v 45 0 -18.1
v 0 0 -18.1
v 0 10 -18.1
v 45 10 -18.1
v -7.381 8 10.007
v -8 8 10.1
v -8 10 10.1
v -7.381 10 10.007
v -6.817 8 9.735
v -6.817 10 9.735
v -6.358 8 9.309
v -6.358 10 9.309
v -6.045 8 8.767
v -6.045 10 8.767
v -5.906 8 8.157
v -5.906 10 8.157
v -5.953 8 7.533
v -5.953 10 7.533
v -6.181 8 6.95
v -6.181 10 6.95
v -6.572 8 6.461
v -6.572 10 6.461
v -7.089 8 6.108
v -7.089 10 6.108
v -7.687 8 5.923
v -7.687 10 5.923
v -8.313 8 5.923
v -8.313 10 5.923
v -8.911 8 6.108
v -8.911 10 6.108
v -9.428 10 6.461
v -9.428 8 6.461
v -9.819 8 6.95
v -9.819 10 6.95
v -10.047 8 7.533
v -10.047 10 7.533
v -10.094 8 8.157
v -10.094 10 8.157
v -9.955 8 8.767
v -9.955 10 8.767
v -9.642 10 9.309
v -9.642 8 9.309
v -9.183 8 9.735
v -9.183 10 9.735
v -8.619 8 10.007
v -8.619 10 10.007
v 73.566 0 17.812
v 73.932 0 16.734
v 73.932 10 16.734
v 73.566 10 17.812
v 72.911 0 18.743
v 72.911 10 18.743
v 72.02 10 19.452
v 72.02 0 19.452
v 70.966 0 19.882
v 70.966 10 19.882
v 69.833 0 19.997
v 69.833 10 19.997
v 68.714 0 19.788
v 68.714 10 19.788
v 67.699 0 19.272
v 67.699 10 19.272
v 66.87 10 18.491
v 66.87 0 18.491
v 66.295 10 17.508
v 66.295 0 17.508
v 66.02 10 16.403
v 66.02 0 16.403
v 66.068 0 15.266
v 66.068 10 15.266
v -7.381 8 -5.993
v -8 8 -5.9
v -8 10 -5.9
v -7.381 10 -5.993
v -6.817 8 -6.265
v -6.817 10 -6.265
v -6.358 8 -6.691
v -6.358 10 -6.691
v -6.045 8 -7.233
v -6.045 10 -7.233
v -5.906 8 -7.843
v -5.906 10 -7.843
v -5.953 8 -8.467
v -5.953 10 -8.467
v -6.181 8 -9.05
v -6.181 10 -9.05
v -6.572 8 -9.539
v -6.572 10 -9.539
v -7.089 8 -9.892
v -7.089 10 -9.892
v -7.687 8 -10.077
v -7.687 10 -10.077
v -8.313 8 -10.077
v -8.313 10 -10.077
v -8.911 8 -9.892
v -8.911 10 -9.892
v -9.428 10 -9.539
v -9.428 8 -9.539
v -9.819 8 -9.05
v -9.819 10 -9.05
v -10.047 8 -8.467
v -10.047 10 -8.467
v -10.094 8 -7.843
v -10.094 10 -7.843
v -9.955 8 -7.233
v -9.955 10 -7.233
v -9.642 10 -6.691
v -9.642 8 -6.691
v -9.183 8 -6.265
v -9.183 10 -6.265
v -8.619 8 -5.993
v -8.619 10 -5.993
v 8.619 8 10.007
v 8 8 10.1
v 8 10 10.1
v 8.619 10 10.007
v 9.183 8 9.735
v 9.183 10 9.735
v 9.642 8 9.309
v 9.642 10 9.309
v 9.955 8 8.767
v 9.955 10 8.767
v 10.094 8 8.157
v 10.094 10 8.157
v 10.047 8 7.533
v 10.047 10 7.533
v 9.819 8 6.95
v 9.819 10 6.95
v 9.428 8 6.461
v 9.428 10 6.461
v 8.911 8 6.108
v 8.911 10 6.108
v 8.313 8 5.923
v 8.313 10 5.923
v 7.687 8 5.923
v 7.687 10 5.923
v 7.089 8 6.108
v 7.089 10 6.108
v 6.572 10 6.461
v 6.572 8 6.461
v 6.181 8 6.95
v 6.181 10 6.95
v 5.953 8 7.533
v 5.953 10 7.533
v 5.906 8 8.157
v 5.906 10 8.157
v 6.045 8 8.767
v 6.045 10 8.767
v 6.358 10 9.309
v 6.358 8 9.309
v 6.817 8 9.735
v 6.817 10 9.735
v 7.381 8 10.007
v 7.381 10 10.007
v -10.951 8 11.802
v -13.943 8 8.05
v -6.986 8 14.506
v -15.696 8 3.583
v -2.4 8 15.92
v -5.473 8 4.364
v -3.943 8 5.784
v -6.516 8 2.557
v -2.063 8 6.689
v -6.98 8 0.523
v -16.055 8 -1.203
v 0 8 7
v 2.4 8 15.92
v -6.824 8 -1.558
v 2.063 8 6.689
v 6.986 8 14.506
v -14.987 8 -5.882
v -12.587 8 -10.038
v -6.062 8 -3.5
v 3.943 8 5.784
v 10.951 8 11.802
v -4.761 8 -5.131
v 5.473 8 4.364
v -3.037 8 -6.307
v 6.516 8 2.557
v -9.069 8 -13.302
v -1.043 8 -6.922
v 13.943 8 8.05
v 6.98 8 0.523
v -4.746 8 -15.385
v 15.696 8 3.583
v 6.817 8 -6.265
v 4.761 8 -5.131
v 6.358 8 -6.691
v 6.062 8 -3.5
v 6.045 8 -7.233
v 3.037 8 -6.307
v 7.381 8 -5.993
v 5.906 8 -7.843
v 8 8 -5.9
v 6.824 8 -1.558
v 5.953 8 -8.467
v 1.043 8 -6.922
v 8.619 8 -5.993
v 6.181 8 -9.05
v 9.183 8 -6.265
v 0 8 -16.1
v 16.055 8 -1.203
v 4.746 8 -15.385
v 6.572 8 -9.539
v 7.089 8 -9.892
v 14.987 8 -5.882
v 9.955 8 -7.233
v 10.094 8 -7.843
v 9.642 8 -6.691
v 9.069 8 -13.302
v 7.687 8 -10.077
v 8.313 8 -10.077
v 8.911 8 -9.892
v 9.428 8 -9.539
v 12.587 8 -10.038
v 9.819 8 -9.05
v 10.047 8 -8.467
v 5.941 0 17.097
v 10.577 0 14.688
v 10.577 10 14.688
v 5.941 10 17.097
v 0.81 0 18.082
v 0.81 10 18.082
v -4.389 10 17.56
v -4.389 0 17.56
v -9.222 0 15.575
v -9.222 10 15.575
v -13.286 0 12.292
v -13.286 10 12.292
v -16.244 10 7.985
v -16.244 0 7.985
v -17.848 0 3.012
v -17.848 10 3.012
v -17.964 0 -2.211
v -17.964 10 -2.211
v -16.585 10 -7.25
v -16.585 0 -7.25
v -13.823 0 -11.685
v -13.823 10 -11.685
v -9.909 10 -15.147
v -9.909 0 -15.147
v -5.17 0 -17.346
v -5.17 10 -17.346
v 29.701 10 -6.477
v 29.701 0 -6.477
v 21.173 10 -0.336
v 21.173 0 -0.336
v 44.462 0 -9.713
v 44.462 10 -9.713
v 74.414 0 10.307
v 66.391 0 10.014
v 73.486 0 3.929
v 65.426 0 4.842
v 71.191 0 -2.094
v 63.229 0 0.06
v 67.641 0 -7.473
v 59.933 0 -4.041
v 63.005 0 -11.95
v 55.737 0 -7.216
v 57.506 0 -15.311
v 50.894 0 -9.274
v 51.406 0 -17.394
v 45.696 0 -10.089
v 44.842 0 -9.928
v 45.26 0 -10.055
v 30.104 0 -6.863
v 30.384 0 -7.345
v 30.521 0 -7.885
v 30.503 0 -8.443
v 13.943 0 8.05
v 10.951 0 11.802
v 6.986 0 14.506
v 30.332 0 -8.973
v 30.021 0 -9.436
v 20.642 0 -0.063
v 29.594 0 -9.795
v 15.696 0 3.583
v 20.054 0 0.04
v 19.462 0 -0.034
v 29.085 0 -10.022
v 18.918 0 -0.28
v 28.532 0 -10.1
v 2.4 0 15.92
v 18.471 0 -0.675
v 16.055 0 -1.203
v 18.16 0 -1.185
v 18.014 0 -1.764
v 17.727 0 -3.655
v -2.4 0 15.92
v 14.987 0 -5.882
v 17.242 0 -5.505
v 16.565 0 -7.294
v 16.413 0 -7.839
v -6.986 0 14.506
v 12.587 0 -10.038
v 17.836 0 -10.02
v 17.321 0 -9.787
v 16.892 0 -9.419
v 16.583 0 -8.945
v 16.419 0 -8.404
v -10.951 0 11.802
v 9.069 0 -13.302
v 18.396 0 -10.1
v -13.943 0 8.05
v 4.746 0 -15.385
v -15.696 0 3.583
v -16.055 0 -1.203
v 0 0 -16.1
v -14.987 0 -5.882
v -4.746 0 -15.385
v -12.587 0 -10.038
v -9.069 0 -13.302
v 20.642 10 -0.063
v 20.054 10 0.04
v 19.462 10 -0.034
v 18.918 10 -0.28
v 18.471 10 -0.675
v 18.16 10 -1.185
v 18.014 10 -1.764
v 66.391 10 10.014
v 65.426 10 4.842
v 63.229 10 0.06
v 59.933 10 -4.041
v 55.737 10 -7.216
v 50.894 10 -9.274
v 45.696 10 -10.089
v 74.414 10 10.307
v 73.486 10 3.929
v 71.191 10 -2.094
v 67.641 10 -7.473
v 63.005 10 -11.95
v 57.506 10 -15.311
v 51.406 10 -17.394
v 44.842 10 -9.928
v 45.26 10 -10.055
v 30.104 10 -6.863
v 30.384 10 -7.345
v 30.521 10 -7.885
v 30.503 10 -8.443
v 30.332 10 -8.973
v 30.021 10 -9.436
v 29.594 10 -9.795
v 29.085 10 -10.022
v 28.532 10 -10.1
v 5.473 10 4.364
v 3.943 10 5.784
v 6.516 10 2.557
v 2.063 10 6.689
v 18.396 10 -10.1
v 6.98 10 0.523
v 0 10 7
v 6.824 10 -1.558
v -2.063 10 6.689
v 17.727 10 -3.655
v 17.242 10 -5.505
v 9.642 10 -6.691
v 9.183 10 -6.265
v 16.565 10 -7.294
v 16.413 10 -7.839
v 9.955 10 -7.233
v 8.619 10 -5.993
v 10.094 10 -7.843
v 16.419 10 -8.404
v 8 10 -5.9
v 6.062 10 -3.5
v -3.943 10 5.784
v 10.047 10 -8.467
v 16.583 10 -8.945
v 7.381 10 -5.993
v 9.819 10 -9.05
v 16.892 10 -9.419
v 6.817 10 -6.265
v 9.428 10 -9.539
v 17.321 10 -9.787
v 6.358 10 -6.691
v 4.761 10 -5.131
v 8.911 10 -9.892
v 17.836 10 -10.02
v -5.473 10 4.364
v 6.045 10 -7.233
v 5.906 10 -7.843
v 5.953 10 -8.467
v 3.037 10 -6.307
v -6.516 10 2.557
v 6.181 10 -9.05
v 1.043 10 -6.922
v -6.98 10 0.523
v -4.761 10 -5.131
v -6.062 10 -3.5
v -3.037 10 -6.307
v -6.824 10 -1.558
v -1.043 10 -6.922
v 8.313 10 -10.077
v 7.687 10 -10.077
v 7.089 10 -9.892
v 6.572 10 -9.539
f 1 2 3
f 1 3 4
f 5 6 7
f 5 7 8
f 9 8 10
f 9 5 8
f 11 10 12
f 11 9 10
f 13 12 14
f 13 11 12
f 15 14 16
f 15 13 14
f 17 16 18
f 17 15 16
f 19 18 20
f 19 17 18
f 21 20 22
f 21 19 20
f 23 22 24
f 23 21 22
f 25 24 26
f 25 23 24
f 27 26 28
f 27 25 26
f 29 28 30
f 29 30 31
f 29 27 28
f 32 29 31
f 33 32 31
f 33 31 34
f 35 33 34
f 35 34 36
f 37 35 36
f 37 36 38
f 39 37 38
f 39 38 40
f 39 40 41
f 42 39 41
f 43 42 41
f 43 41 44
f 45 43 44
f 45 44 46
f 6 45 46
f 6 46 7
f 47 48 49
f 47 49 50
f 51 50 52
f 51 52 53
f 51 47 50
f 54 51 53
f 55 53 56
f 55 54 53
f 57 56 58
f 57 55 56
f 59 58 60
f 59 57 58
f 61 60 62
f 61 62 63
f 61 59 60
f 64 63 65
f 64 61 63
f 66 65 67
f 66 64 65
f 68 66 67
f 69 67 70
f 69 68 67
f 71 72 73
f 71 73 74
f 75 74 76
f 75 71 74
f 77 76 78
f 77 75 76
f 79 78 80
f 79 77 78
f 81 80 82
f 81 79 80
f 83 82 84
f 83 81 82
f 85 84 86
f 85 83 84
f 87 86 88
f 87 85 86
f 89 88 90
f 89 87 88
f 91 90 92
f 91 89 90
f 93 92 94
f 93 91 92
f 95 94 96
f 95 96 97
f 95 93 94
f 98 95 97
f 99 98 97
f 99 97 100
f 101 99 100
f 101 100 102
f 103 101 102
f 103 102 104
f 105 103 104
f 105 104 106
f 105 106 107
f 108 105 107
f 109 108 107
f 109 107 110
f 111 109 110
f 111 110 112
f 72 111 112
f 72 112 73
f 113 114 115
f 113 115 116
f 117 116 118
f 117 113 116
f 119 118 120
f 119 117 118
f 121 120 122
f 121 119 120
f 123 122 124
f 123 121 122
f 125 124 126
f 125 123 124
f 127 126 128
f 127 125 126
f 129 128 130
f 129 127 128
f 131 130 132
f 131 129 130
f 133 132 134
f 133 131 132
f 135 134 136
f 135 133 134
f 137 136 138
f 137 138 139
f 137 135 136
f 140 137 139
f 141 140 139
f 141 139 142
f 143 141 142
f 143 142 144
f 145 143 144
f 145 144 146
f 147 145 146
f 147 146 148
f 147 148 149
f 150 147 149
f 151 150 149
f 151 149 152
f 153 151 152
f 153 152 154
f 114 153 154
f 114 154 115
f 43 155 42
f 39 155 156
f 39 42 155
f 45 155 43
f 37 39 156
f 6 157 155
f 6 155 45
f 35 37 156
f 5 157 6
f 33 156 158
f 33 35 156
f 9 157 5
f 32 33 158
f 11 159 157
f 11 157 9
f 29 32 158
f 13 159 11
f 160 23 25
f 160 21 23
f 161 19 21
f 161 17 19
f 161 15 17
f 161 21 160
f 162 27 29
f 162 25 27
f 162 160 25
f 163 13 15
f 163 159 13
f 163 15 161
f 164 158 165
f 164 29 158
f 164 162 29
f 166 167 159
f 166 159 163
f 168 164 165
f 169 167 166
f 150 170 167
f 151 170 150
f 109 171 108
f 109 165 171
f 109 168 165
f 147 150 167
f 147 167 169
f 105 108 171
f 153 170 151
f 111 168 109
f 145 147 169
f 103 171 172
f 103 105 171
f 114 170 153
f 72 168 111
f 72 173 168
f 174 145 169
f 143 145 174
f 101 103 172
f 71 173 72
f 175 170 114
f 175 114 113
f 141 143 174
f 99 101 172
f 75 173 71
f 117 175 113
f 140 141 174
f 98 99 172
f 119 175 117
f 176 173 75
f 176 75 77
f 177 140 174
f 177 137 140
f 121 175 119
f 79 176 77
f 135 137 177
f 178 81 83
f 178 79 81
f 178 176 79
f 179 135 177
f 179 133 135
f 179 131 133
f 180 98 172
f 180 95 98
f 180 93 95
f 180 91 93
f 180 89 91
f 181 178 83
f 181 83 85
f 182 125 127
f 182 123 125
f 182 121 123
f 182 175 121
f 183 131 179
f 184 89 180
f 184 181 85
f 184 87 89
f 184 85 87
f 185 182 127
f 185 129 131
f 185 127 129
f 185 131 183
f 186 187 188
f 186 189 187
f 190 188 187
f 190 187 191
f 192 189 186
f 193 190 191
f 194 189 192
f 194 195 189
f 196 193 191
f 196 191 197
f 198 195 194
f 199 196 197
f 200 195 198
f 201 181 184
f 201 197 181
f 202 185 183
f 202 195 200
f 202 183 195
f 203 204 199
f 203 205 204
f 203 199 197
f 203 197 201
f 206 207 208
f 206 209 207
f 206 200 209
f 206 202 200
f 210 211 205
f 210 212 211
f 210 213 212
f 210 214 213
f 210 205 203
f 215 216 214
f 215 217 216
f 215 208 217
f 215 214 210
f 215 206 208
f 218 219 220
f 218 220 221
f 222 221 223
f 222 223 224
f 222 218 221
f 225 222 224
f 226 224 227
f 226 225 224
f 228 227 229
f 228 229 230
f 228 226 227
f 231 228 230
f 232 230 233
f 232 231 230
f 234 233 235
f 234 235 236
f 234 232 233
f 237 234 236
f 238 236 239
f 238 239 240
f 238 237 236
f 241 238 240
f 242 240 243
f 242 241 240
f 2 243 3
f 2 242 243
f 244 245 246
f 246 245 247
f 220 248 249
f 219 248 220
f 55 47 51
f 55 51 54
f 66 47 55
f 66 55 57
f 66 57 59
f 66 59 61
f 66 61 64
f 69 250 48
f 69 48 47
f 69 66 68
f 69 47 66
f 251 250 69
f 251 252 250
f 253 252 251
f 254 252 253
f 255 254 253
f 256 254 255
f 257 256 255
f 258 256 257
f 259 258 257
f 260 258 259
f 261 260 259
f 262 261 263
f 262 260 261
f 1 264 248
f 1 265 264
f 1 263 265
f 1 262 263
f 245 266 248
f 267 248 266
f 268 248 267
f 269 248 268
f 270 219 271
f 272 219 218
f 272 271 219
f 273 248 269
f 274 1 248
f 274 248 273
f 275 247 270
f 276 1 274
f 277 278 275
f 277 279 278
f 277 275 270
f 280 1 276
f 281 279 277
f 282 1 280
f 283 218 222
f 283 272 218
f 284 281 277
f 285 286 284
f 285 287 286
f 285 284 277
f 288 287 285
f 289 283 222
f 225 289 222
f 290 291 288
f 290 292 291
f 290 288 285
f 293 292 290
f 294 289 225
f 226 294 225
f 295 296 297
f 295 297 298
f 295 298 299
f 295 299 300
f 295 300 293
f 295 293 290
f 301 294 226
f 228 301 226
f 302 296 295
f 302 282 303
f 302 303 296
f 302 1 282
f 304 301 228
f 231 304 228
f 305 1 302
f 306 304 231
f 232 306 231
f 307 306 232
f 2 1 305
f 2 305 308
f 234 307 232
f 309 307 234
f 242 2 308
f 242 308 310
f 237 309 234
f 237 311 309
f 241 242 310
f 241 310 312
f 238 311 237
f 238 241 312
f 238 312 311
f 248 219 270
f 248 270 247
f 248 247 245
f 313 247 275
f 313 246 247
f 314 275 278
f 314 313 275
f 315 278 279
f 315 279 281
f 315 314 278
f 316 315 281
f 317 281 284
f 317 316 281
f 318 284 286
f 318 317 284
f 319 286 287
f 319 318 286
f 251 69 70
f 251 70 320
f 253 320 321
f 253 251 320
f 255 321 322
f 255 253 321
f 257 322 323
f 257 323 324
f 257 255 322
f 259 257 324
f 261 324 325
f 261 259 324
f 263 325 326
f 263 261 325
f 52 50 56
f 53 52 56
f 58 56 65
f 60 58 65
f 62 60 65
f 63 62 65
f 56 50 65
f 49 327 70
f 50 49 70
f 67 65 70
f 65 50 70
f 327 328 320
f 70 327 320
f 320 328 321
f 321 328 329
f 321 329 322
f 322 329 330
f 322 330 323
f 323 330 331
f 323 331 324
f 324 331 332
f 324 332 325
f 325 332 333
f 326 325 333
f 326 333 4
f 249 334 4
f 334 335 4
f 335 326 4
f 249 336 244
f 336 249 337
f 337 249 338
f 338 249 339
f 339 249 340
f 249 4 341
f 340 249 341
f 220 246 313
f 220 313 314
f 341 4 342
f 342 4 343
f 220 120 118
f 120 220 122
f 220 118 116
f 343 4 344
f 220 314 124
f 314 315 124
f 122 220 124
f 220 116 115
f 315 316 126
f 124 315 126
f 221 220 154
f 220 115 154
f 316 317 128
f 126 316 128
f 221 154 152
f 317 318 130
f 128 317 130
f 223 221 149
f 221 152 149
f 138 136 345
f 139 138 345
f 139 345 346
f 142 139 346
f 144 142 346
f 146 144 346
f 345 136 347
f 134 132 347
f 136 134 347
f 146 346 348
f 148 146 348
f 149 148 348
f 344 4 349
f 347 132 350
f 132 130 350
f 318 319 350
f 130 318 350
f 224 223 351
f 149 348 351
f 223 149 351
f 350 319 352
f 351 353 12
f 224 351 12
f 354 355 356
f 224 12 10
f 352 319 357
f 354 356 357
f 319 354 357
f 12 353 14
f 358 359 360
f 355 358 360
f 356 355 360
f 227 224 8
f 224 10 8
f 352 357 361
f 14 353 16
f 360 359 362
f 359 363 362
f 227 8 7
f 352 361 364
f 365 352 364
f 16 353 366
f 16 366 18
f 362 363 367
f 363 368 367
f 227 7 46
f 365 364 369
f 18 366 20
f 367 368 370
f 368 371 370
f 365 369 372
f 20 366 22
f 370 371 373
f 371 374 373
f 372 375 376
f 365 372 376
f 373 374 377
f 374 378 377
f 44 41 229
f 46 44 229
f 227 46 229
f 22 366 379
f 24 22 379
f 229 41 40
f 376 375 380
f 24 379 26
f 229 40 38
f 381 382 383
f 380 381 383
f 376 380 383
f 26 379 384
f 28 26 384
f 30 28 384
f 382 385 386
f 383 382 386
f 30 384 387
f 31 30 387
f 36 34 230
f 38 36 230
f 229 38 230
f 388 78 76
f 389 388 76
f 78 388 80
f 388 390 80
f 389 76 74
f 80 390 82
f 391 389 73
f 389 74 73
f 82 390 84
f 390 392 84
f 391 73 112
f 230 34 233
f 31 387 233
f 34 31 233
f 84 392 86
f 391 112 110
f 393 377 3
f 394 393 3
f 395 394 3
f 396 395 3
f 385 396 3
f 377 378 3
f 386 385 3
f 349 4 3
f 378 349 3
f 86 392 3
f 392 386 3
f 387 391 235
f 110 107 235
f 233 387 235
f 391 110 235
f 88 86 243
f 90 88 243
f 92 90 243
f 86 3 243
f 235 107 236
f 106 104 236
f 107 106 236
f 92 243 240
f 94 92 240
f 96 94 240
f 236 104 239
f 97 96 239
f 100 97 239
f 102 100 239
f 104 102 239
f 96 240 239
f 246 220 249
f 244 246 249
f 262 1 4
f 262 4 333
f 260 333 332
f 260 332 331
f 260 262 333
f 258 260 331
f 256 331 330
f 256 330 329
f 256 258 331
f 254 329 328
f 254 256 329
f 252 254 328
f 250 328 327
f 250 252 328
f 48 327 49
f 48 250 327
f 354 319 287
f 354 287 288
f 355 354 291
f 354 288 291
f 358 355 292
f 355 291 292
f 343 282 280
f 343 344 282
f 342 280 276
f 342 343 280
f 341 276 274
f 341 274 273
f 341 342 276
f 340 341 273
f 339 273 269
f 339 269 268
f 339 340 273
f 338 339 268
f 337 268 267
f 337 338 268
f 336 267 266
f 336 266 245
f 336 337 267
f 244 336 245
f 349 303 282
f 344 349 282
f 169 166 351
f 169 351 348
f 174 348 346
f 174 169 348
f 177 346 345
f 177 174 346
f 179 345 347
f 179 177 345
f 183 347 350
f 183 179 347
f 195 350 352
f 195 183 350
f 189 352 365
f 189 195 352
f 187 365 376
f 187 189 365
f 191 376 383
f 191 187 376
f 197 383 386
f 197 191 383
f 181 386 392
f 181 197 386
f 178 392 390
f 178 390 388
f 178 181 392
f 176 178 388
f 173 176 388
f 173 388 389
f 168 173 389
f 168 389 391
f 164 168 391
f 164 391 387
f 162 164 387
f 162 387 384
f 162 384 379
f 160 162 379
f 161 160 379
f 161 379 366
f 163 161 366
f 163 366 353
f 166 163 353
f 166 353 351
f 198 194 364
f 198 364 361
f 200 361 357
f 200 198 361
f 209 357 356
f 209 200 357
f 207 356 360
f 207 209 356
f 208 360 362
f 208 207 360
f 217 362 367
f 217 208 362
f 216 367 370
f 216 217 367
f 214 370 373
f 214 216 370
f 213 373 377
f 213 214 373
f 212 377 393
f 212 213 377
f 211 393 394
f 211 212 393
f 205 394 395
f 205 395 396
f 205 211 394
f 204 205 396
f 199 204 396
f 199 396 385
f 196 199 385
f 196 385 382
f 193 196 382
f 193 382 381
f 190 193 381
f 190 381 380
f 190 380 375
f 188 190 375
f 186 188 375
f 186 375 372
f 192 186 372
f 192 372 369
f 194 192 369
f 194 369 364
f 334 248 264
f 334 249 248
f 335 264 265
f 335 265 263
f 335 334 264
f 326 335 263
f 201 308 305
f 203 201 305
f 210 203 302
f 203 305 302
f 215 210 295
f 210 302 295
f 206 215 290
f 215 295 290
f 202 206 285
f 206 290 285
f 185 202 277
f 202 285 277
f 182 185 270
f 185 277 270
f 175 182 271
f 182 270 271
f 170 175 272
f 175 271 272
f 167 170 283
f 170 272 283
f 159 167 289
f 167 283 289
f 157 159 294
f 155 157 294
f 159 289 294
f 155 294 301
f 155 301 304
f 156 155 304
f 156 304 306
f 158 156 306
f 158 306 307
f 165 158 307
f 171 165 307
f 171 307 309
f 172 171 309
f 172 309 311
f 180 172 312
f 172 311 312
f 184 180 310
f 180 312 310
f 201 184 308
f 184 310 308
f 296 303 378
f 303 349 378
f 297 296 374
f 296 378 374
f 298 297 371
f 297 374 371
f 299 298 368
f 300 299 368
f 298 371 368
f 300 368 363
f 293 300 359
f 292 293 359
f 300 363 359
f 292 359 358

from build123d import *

# Parameters (mm, degrees)
SKETCH1_R           = 2.1
SKETCH1_R_2         = 7
BOSS_EXTRUDE1_DEPTH = 10
FILLET1_R           = 2
SKETCH2_R           = 16.1
CUT_EXTRUDE1_DEPTH  = 8


with BuildPart() as part:
    # Sketch1 → Boss-Extrude1 (new body)
    with BuildSketch(Plane(origin=(0, 0, 0), x_dir=(1, 0, 0), z_dir=(0, 1, 0))):
        with BuildLine():
            Line((0, 18.1), (45, 18.1))
            ThreePointArc((45, 18.1), (67.641132128, 7.472867216), (73.932044859, -16.734182011))
            ThreePointArc((73.932044859, -16.734182011), (69.265817989, -19.932044859), (66.067955141, -15.265817989))
            ThreePointArc((66.067955141, -15.265817989), (61.486990751, 2.361454112), (45, 10.1))
            Line((45, 10.1), (10.576879596, -14.68807741))
            ThreePointArc((10.576879596, -14.68807741), (-17.225913635, -5.556788591), (0, 18.1))
        make_face()
        with Locations(Location((-8, 8, 0), (0, 0, 270))):
            Circle(SKETCH1_R, mode=Mode.SUBTRACT)
        with Locations(Location((8, 8, 0), (0, 0, 270))):
            Circle(SKETCH1_R, mode=Mode.SUBTRACT)
        with Locations(Location((8, -8, 0), (0, 0, 270))):
            Circle(SKETCH1_R, mode=Mode.SUBTRACT)
        with Locations(Location((-8, -8, 0), (0, 0, 270))):
            Circle(SKETCH1_R, mode=Mode.SUBTRACT)
        with Locations(Location((0, 0, 0), (0, 0, 270))):
            Circle(SKETCH1_R_2, mode=Mode.SUBTRACT)
        with BuildLine():
            Line((15.019986684, 10.1), (34.732321427, 10.1))
            Line((34.732321427, 10.1), (17.994323759, -1.953026484))
            ThreePointArc((17.994323759, -1.953026484), (17.572849381, 4.336469143), (15.019986684, 10.1))
        make_face(mode=Mode.SUBTRACT)
    extrude(amount=BOSS_EXTRUDE1_DEPTH)

    # Fillet1
    fillet1_edges = [part.edges().sort_by_distance(p)[0] for p in [
        (45, 5, -10.1),
        (15.019986684, 5, -10.1),
        (17.994323759, 5, 1.953026484),
        (34.732321427, 5, -10.1),
    ]]
    fillet(fillet1_edges, radius=FILLET1_R)

    # Sketch2 → Cut-Extrude1 (cut)
    with BuildSketch(Plane.XZ):
        with Locations(Location((0, 0, 0), (0, 0, 270))):
            Circle(SKETCH2_R)
    extrude(amount=-CUT_EXTRUDE1_DEPTH, mode=Mode.SUBTRACT)


solid = part.part
